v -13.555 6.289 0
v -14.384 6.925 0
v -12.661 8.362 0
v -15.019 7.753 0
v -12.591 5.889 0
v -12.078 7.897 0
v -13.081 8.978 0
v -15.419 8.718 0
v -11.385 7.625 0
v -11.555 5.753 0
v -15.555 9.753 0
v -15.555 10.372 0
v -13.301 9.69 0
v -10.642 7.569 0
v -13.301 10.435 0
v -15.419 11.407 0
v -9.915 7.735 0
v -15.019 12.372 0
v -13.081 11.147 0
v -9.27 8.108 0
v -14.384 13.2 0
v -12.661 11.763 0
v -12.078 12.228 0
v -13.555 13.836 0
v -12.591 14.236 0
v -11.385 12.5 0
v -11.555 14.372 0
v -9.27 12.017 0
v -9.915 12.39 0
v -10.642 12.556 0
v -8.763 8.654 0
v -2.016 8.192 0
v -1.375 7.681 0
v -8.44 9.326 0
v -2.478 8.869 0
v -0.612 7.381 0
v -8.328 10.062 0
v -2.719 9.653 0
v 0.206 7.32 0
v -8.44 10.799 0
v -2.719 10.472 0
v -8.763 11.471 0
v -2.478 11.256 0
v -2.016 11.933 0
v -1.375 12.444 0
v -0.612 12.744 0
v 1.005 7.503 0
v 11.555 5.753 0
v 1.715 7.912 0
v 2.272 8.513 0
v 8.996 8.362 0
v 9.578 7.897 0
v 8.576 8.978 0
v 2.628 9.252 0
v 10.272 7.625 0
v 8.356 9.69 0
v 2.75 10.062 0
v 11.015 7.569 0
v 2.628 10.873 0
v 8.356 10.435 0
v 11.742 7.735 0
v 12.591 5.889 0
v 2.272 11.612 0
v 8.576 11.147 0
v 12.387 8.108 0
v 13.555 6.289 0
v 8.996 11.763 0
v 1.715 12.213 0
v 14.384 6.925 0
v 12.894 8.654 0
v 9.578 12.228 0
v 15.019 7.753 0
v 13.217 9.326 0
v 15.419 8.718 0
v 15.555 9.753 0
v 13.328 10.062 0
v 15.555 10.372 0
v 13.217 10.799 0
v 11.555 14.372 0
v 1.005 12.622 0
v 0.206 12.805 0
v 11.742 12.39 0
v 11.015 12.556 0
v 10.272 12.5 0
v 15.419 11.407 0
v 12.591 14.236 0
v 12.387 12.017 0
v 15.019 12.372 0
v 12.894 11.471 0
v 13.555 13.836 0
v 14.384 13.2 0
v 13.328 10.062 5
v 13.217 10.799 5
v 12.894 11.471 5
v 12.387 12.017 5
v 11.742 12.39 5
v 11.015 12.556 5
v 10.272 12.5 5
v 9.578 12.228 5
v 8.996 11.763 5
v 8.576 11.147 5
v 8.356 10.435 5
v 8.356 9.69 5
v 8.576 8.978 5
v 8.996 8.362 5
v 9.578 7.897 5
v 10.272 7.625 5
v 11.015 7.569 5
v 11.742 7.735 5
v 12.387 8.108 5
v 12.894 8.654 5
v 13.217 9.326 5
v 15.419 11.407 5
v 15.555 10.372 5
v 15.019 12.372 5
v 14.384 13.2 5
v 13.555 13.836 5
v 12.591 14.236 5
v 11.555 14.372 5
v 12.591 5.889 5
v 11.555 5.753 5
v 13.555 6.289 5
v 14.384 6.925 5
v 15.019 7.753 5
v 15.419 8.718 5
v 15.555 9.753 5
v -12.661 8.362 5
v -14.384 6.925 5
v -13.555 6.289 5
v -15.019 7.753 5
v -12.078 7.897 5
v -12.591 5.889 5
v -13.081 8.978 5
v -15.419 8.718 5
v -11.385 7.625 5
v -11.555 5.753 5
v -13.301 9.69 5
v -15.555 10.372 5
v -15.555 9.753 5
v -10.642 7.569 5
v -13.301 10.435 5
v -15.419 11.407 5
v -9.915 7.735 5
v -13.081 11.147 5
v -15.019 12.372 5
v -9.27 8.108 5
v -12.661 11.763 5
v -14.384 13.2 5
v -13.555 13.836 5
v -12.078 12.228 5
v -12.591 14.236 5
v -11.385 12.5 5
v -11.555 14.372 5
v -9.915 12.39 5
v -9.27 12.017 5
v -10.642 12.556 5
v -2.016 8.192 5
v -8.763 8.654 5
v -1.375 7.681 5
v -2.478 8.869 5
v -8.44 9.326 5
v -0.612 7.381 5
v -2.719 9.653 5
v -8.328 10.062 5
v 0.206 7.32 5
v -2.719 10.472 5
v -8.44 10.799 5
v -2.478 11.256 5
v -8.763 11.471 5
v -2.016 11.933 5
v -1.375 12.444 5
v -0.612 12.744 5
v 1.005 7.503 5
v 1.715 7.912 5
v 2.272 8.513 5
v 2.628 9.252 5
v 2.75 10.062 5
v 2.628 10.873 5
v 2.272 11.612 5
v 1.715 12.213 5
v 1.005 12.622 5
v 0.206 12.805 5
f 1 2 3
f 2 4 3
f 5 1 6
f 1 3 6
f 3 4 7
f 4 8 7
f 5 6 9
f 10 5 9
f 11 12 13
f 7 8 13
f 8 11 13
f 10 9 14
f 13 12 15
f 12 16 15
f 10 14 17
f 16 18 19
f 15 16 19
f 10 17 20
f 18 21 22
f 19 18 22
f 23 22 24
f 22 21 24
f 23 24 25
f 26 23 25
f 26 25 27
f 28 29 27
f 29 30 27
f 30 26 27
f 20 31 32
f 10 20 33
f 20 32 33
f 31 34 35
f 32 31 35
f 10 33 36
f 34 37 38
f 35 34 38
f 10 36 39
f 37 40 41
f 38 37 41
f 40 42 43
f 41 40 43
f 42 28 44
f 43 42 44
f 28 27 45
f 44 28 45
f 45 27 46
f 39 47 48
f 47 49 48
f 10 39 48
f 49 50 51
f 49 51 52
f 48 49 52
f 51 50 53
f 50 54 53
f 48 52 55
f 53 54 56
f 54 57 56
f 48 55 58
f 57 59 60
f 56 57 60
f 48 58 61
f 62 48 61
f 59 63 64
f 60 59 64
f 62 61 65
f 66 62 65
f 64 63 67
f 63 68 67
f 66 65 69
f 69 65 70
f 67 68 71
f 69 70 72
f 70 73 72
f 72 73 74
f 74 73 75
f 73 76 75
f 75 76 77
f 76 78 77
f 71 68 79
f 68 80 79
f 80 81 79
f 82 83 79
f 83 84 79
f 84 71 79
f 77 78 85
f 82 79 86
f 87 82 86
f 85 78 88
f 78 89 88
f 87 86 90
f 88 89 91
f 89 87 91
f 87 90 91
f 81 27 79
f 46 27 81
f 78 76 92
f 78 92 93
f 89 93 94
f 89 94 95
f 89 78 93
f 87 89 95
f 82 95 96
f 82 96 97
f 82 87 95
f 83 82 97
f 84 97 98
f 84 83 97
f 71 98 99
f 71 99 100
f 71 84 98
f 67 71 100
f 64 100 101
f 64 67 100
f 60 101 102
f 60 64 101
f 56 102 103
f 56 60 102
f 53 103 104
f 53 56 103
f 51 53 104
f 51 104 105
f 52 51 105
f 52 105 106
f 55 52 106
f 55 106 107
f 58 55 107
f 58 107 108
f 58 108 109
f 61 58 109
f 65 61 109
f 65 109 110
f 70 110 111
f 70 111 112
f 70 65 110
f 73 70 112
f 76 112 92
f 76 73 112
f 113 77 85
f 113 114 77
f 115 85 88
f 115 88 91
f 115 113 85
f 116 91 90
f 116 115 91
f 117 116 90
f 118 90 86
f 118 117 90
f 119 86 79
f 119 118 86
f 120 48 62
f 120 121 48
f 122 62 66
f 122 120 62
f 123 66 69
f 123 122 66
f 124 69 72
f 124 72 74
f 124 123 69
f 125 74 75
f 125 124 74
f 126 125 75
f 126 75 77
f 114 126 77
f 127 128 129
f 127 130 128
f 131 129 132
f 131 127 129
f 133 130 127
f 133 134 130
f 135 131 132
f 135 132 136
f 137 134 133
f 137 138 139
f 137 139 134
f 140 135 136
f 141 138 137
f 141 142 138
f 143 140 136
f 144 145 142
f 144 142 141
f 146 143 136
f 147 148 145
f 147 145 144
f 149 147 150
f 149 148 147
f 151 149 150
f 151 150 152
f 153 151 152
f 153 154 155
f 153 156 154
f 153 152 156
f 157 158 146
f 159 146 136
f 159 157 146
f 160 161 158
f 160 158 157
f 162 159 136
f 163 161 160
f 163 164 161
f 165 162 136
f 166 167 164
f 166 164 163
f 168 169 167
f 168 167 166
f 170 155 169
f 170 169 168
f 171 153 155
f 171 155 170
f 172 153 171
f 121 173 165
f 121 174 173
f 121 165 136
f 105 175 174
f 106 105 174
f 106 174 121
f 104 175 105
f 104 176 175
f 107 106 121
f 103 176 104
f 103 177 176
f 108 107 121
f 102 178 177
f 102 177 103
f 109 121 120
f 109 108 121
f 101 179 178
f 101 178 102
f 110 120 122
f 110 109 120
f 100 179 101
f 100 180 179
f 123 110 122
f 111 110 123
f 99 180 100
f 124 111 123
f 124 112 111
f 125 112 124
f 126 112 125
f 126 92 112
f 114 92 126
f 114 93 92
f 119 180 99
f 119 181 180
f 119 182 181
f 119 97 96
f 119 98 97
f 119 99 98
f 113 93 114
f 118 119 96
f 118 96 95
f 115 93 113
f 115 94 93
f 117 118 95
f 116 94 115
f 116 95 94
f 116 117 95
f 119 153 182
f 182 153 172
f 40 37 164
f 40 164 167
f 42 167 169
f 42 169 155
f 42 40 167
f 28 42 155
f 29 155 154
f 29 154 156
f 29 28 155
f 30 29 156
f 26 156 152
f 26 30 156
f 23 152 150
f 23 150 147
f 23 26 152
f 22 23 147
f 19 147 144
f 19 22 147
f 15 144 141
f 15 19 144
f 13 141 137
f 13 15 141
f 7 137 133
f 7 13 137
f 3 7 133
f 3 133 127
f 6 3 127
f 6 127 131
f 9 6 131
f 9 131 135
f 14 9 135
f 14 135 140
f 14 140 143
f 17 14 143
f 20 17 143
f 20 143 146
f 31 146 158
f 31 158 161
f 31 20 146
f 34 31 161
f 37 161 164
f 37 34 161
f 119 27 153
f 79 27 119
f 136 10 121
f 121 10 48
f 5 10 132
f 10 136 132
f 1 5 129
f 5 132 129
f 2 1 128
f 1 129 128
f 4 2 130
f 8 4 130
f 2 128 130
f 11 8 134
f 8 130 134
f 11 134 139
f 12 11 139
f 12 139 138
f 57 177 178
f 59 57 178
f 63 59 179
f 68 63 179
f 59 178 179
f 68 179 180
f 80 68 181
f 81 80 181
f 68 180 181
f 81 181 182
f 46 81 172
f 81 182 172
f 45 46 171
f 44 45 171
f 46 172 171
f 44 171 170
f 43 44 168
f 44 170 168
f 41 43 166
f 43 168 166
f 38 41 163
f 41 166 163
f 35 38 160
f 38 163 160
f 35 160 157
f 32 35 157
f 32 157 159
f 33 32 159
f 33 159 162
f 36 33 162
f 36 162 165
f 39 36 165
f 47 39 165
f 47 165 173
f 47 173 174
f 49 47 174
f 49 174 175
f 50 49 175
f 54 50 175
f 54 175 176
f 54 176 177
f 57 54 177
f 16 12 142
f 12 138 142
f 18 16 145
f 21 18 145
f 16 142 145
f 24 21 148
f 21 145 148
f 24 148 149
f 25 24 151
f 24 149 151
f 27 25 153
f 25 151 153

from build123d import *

# Parameters (mm, degrees)
SKETCH1_W           = 15.555334961
SKETCH1_H           = 8.618657178
SKETCH1_R           = 2.5
BOSS_EXTRUDE1_DEPTH = 5
SKETCH2_R           = 2.75
CUT_EXTRUDE1_DEPTH  = 22.76046651
FILLET1_R           = 4


with BuildPart() as part:
    # Sketch1 → Boss-Extrude1 (new body)
    # profile 1 of 2: a face of its own
    with BuildSketch(Plane.XY):
        with Locations((-7.777667481, 10.0625)):
            Rectangle(SKETCH1_W, SKETCH1_H)
        with Locations((-10.828492502, 10.0625)):
            Circle(SKETCH1_R, mode=Mode.SUBTRACT)
    # profile 2 of 2: a face of its own
    with BuildSketch(Plane.XY):
        with Locations((7.777667481, 10.0625)):
            Rectangle(SKETCH1_W, SKETCH1_H)
        with Locations((10.828492502, 10.0625)):
            Circle(SKETCH1_R, mode=Mode.SUBTRACT)
    extrude(amount=BOSS_EXTRUDE1_DEPTH)

    # Sketch2 → Cut-Extrude1 (cut, through all)
    with BuildSketch(Plane.XY.offset(5)):
        with Locations((0, 10.0625)):
            Circle(SKETCH2_R)
    extrude(amount=-CUT_EXTRUDE1_DEPTH, mode=Mode.SUBTRACT)

    # Fillet1
    fillet1_edges = [part.edges().sort_by_distance(p)[0] for p in [
        (15.555334961, 14.371828589, 2.5),
        (15.555334961, 5.753171411, 2.5),
        (-15.555334961, 5.753171411, 2.5),
        (-15.555334961, 14.371828589, 2.5),
    ]]
    fillet(fillet1_edges, radius=FILLET1_R)


solid = part.part
